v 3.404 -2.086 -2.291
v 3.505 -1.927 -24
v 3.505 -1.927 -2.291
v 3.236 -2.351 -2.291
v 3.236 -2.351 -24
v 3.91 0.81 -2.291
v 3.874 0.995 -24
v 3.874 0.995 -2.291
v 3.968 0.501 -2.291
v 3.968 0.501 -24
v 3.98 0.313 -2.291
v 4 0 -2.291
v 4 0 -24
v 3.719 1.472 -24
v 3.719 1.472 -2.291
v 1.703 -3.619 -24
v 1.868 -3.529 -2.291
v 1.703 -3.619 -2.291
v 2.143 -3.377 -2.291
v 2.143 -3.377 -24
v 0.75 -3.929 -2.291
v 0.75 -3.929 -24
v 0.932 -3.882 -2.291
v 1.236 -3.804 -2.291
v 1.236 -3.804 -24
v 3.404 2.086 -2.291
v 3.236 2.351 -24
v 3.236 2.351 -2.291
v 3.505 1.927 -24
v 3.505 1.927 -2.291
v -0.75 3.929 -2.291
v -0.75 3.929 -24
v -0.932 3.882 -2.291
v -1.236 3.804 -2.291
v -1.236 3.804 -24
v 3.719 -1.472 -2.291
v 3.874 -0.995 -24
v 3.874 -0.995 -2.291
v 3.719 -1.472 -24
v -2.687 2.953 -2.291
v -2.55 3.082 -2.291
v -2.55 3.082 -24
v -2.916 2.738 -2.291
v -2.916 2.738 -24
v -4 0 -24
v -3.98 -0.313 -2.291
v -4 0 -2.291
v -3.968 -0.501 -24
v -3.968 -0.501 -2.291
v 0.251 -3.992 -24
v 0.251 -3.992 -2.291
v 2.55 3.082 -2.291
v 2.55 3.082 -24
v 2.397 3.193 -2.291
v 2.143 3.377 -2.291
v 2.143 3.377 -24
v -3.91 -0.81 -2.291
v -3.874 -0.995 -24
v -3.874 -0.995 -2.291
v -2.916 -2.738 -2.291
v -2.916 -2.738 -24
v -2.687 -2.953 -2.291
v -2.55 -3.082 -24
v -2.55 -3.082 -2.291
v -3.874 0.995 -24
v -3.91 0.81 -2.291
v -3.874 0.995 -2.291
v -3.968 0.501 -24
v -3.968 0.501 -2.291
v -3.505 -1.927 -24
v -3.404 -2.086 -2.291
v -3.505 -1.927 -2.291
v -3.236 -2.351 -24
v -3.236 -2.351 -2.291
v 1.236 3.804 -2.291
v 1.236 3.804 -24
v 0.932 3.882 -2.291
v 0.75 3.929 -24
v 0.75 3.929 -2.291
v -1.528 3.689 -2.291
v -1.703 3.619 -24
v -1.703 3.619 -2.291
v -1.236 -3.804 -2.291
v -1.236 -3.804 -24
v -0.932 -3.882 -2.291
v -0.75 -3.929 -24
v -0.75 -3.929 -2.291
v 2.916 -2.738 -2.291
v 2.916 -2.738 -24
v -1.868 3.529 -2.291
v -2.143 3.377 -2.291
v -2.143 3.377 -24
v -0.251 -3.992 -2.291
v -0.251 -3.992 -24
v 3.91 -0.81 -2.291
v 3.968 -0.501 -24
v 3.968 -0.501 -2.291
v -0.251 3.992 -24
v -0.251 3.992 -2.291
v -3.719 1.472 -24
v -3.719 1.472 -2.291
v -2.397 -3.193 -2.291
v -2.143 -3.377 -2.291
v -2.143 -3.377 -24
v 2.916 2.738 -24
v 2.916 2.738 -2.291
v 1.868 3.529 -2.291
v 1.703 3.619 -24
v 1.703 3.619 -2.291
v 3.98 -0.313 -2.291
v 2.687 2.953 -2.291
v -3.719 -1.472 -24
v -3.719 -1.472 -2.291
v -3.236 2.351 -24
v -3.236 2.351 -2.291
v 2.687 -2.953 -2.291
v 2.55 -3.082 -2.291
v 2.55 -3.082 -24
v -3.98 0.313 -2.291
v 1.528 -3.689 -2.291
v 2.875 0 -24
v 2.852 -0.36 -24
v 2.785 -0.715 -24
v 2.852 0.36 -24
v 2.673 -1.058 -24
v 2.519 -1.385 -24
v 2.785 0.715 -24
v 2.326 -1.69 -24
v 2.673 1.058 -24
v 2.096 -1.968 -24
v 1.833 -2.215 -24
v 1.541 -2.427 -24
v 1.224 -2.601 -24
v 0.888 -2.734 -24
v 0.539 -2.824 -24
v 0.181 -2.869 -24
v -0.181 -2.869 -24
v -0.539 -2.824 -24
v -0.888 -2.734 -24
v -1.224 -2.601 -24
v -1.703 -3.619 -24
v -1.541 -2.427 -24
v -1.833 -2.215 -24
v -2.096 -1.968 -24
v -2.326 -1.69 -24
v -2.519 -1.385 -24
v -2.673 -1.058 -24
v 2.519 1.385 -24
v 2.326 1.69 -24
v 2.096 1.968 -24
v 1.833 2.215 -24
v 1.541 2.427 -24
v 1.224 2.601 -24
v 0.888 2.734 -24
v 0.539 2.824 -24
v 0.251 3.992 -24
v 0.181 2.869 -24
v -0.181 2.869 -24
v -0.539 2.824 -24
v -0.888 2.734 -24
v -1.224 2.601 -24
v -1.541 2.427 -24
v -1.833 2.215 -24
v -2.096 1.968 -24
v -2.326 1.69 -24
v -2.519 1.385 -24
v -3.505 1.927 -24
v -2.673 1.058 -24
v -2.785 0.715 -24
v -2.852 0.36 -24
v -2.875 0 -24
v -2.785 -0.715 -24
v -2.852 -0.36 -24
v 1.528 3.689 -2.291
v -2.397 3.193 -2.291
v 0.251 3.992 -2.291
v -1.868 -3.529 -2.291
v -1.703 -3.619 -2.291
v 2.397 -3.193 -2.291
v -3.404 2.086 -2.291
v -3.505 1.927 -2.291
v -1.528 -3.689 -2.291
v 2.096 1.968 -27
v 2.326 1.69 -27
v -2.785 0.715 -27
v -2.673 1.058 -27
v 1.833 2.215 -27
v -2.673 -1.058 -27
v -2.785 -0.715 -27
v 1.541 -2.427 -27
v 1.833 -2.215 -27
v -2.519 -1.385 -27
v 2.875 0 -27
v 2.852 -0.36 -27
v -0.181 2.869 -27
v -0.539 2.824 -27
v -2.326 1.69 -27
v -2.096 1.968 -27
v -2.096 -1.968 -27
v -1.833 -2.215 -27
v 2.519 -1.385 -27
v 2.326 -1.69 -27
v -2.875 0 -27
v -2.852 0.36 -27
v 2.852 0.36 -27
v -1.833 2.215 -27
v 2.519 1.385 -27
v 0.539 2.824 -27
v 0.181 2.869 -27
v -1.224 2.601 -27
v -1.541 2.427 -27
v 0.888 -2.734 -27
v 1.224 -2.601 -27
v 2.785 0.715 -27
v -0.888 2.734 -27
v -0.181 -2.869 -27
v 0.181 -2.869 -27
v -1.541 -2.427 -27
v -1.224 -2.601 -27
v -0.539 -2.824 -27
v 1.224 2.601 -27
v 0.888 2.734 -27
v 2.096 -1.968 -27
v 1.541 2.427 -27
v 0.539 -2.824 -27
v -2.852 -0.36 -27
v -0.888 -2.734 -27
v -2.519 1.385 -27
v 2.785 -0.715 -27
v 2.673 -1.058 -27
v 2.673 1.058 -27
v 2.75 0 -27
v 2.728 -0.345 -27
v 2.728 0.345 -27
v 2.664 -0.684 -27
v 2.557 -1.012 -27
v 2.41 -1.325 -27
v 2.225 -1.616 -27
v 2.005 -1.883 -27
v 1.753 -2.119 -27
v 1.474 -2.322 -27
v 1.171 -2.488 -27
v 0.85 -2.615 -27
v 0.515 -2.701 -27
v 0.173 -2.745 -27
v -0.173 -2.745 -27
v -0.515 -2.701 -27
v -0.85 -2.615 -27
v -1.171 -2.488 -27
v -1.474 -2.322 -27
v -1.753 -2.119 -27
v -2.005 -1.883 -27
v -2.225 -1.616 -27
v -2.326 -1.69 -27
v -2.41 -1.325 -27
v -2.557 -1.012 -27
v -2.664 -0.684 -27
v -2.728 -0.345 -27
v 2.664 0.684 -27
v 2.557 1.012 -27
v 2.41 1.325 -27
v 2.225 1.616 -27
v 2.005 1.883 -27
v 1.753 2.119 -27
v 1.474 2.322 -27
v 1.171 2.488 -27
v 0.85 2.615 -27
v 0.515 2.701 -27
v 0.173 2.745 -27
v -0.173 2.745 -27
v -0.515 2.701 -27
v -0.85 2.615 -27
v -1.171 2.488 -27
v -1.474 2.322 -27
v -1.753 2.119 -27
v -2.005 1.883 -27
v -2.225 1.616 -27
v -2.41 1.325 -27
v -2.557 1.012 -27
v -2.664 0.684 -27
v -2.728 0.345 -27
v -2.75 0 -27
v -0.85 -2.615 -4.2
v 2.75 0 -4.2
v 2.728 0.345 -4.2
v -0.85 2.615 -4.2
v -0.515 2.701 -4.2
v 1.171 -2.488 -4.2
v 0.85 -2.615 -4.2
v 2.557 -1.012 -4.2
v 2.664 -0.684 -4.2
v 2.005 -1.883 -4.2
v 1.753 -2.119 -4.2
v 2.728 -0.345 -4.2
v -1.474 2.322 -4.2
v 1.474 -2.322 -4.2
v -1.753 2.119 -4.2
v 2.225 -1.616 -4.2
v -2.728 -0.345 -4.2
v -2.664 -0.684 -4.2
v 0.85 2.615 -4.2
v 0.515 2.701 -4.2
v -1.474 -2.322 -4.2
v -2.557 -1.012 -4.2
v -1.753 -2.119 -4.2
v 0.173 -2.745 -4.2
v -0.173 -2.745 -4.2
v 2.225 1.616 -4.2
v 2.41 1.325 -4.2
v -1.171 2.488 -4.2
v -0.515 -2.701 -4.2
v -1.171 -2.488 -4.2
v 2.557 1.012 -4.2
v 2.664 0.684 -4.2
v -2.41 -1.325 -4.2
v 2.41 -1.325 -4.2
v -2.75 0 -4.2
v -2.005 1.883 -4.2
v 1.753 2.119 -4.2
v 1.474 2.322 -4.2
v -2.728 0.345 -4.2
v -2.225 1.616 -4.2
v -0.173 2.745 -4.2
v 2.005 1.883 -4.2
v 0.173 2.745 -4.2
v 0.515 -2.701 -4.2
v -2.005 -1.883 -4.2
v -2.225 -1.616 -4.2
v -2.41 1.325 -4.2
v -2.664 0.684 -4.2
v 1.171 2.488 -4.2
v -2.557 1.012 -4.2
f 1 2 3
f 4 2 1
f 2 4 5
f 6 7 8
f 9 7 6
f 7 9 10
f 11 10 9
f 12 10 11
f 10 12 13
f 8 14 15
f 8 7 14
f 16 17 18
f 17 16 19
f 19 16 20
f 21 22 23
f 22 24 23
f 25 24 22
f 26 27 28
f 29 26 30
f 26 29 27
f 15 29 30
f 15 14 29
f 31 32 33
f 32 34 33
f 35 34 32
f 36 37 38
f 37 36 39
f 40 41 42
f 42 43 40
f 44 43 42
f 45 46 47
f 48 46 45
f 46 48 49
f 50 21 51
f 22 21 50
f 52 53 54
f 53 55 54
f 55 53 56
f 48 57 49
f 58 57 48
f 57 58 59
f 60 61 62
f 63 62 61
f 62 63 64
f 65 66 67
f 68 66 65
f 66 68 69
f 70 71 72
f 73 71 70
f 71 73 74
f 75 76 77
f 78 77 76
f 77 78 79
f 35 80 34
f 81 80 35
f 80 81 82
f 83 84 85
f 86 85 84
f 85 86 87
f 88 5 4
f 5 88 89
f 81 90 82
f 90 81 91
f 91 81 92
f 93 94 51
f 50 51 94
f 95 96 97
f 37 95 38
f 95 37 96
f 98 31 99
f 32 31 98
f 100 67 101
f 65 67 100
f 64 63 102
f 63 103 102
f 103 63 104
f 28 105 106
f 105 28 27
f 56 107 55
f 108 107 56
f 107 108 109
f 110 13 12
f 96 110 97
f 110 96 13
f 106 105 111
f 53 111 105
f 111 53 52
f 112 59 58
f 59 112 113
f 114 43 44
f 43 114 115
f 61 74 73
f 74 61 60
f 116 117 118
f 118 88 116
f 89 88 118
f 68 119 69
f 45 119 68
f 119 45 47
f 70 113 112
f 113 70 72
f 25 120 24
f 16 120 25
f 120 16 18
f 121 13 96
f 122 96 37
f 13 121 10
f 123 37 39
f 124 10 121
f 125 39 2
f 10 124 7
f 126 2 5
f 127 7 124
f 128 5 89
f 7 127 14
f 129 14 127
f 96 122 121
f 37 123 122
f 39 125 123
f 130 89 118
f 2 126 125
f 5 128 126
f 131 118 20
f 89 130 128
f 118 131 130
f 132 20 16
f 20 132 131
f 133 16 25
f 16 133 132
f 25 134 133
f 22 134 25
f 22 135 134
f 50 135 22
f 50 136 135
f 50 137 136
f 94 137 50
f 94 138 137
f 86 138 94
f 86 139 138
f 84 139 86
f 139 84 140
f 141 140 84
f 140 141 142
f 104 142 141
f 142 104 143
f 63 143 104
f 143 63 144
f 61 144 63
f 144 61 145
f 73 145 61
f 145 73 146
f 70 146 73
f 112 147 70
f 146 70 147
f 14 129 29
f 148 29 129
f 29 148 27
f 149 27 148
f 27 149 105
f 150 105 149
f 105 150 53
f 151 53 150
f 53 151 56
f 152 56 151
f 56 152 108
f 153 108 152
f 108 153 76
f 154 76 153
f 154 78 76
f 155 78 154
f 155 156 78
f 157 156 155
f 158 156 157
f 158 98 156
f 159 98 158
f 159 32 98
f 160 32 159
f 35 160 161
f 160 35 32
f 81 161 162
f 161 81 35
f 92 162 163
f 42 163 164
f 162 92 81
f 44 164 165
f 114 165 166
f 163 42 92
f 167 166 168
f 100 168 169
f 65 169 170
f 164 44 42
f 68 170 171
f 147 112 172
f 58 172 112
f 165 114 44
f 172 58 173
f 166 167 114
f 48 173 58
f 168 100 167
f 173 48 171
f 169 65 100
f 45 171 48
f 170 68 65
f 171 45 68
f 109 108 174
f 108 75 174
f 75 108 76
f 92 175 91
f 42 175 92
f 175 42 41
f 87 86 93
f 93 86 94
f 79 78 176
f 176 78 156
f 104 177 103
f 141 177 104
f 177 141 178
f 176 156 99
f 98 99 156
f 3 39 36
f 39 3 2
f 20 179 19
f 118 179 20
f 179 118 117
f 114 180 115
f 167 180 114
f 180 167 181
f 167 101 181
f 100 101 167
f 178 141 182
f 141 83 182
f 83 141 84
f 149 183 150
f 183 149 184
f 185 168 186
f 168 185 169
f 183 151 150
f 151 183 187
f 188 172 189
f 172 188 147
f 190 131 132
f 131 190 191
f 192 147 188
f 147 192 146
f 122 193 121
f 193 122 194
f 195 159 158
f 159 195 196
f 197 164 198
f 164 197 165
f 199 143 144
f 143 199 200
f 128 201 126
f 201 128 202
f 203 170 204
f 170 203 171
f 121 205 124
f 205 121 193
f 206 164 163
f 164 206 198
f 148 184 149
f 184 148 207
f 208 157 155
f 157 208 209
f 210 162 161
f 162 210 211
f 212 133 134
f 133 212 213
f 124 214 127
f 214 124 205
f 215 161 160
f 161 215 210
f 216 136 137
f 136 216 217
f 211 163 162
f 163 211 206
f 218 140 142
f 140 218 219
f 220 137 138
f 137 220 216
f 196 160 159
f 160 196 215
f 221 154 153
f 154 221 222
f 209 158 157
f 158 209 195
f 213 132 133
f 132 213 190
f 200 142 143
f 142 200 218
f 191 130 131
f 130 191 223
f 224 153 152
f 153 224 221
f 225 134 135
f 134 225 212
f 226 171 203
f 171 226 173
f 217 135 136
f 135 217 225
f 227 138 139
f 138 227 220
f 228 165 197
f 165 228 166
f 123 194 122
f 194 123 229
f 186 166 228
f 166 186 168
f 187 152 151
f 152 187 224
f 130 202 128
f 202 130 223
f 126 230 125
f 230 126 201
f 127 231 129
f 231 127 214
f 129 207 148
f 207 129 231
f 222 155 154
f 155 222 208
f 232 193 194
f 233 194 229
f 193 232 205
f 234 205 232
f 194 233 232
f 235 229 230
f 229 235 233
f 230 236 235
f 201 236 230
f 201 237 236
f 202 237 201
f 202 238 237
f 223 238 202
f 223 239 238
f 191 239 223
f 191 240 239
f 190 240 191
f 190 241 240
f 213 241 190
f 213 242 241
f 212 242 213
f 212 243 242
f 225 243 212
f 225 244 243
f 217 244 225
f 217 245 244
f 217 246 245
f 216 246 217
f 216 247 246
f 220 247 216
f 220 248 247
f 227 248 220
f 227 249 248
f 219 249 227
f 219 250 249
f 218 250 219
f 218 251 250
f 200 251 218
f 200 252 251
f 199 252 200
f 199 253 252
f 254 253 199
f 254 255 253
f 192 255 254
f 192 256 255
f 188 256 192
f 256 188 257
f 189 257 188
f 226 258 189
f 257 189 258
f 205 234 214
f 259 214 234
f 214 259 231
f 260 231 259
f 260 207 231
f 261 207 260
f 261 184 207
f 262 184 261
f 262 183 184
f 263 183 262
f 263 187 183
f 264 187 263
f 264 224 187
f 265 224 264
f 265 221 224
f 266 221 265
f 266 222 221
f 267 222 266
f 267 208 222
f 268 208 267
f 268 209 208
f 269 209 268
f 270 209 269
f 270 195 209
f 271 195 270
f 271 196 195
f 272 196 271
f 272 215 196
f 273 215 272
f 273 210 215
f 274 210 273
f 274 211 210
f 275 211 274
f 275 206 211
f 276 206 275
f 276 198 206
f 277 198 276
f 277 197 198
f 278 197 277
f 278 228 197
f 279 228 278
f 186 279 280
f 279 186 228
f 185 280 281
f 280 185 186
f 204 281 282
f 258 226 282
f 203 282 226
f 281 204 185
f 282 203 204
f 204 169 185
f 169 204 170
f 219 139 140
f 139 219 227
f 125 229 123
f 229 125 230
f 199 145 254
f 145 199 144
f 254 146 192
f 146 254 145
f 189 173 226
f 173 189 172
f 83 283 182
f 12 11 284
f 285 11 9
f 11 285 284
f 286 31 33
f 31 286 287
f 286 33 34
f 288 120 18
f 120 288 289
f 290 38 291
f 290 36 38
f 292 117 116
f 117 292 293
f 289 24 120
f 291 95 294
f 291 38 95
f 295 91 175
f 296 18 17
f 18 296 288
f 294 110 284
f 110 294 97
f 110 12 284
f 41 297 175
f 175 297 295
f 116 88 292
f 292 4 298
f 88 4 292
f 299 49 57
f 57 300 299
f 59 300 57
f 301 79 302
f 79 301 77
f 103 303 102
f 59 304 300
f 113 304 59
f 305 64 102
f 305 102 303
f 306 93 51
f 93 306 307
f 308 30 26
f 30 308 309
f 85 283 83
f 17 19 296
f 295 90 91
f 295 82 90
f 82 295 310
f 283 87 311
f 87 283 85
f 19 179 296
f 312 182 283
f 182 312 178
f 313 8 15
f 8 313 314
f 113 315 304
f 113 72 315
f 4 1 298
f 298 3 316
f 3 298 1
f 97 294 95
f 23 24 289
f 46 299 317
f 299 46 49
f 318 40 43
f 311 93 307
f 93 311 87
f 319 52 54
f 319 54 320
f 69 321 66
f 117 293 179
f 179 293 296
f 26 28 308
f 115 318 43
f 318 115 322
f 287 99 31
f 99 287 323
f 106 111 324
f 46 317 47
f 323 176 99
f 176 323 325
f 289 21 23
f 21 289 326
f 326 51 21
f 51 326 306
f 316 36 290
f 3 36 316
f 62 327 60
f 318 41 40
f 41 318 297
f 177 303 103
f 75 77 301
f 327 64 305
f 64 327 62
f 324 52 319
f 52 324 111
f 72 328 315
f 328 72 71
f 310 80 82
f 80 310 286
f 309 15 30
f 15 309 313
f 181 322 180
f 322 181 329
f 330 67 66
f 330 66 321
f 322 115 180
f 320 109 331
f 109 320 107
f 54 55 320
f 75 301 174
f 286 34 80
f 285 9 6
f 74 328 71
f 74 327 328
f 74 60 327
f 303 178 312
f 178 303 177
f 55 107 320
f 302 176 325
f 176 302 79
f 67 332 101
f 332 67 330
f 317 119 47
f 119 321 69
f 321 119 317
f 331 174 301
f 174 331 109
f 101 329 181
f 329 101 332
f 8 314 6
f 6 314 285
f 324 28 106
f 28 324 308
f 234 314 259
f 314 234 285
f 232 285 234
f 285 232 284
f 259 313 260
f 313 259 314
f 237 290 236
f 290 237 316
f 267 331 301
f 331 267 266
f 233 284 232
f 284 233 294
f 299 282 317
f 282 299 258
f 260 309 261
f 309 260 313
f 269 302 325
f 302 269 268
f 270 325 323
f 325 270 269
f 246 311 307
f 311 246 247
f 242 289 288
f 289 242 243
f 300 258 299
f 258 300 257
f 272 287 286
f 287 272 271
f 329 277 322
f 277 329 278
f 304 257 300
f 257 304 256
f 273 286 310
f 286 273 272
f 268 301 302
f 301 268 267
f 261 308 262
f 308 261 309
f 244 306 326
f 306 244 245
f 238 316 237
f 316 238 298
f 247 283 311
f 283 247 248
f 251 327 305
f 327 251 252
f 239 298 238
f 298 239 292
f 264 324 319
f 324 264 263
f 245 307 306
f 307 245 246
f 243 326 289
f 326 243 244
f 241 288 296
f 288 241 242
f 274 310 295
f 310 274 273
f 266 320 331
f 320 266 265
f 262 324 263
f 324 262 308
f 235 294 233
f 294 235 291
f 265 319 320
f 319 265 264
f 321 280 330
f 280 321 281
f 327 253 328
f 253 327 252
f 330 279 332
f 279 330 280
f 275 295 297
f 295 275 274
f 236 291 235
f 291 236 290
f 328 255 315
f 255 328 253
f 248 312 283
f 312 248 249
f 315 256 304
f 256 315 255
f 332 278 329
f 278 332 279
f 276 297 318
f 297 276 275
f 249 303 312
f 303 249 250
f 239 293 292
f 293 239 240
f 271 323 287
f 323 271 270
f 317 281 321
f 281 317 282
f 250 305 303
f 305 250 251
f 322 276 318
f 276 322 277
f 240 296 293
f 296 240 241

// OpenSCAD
$fn = 50;

difference() {
	union() {
		translate(v = [0, 0, -24.0]) {
			cylinder(h = 27, r = 4.0);
		}
		#translate(v = [0, 0, -27.0]) {
			cylinder(h = 27, r = 2.875);
		}
	}
	union() {
		translate(v = [0, 0, 0]) {
			rotate(a = [0, 0, 0]) {
				difference() {
					union() {
						translate(v = [0, 0, -27.0]) {
							cylinder(h = 27, r = 2.25);
						}
						translate(v = [0, 0, -4.2]) {
							cylinder(h = 4.2, r1 = 2.75, r2 = 5.5);
						}
						translate(v = [0, 0, -27.0]) {
							cylinder(h = 27, r = 2.75);
						}
						translate(v = [0, 0, -27.0]) {
							cylinder(h = 27, r = 2.25);
						}
					}
					union();
				}
			}
		}
		#cylinder(h = 3, r = 6.25);
	}
}
